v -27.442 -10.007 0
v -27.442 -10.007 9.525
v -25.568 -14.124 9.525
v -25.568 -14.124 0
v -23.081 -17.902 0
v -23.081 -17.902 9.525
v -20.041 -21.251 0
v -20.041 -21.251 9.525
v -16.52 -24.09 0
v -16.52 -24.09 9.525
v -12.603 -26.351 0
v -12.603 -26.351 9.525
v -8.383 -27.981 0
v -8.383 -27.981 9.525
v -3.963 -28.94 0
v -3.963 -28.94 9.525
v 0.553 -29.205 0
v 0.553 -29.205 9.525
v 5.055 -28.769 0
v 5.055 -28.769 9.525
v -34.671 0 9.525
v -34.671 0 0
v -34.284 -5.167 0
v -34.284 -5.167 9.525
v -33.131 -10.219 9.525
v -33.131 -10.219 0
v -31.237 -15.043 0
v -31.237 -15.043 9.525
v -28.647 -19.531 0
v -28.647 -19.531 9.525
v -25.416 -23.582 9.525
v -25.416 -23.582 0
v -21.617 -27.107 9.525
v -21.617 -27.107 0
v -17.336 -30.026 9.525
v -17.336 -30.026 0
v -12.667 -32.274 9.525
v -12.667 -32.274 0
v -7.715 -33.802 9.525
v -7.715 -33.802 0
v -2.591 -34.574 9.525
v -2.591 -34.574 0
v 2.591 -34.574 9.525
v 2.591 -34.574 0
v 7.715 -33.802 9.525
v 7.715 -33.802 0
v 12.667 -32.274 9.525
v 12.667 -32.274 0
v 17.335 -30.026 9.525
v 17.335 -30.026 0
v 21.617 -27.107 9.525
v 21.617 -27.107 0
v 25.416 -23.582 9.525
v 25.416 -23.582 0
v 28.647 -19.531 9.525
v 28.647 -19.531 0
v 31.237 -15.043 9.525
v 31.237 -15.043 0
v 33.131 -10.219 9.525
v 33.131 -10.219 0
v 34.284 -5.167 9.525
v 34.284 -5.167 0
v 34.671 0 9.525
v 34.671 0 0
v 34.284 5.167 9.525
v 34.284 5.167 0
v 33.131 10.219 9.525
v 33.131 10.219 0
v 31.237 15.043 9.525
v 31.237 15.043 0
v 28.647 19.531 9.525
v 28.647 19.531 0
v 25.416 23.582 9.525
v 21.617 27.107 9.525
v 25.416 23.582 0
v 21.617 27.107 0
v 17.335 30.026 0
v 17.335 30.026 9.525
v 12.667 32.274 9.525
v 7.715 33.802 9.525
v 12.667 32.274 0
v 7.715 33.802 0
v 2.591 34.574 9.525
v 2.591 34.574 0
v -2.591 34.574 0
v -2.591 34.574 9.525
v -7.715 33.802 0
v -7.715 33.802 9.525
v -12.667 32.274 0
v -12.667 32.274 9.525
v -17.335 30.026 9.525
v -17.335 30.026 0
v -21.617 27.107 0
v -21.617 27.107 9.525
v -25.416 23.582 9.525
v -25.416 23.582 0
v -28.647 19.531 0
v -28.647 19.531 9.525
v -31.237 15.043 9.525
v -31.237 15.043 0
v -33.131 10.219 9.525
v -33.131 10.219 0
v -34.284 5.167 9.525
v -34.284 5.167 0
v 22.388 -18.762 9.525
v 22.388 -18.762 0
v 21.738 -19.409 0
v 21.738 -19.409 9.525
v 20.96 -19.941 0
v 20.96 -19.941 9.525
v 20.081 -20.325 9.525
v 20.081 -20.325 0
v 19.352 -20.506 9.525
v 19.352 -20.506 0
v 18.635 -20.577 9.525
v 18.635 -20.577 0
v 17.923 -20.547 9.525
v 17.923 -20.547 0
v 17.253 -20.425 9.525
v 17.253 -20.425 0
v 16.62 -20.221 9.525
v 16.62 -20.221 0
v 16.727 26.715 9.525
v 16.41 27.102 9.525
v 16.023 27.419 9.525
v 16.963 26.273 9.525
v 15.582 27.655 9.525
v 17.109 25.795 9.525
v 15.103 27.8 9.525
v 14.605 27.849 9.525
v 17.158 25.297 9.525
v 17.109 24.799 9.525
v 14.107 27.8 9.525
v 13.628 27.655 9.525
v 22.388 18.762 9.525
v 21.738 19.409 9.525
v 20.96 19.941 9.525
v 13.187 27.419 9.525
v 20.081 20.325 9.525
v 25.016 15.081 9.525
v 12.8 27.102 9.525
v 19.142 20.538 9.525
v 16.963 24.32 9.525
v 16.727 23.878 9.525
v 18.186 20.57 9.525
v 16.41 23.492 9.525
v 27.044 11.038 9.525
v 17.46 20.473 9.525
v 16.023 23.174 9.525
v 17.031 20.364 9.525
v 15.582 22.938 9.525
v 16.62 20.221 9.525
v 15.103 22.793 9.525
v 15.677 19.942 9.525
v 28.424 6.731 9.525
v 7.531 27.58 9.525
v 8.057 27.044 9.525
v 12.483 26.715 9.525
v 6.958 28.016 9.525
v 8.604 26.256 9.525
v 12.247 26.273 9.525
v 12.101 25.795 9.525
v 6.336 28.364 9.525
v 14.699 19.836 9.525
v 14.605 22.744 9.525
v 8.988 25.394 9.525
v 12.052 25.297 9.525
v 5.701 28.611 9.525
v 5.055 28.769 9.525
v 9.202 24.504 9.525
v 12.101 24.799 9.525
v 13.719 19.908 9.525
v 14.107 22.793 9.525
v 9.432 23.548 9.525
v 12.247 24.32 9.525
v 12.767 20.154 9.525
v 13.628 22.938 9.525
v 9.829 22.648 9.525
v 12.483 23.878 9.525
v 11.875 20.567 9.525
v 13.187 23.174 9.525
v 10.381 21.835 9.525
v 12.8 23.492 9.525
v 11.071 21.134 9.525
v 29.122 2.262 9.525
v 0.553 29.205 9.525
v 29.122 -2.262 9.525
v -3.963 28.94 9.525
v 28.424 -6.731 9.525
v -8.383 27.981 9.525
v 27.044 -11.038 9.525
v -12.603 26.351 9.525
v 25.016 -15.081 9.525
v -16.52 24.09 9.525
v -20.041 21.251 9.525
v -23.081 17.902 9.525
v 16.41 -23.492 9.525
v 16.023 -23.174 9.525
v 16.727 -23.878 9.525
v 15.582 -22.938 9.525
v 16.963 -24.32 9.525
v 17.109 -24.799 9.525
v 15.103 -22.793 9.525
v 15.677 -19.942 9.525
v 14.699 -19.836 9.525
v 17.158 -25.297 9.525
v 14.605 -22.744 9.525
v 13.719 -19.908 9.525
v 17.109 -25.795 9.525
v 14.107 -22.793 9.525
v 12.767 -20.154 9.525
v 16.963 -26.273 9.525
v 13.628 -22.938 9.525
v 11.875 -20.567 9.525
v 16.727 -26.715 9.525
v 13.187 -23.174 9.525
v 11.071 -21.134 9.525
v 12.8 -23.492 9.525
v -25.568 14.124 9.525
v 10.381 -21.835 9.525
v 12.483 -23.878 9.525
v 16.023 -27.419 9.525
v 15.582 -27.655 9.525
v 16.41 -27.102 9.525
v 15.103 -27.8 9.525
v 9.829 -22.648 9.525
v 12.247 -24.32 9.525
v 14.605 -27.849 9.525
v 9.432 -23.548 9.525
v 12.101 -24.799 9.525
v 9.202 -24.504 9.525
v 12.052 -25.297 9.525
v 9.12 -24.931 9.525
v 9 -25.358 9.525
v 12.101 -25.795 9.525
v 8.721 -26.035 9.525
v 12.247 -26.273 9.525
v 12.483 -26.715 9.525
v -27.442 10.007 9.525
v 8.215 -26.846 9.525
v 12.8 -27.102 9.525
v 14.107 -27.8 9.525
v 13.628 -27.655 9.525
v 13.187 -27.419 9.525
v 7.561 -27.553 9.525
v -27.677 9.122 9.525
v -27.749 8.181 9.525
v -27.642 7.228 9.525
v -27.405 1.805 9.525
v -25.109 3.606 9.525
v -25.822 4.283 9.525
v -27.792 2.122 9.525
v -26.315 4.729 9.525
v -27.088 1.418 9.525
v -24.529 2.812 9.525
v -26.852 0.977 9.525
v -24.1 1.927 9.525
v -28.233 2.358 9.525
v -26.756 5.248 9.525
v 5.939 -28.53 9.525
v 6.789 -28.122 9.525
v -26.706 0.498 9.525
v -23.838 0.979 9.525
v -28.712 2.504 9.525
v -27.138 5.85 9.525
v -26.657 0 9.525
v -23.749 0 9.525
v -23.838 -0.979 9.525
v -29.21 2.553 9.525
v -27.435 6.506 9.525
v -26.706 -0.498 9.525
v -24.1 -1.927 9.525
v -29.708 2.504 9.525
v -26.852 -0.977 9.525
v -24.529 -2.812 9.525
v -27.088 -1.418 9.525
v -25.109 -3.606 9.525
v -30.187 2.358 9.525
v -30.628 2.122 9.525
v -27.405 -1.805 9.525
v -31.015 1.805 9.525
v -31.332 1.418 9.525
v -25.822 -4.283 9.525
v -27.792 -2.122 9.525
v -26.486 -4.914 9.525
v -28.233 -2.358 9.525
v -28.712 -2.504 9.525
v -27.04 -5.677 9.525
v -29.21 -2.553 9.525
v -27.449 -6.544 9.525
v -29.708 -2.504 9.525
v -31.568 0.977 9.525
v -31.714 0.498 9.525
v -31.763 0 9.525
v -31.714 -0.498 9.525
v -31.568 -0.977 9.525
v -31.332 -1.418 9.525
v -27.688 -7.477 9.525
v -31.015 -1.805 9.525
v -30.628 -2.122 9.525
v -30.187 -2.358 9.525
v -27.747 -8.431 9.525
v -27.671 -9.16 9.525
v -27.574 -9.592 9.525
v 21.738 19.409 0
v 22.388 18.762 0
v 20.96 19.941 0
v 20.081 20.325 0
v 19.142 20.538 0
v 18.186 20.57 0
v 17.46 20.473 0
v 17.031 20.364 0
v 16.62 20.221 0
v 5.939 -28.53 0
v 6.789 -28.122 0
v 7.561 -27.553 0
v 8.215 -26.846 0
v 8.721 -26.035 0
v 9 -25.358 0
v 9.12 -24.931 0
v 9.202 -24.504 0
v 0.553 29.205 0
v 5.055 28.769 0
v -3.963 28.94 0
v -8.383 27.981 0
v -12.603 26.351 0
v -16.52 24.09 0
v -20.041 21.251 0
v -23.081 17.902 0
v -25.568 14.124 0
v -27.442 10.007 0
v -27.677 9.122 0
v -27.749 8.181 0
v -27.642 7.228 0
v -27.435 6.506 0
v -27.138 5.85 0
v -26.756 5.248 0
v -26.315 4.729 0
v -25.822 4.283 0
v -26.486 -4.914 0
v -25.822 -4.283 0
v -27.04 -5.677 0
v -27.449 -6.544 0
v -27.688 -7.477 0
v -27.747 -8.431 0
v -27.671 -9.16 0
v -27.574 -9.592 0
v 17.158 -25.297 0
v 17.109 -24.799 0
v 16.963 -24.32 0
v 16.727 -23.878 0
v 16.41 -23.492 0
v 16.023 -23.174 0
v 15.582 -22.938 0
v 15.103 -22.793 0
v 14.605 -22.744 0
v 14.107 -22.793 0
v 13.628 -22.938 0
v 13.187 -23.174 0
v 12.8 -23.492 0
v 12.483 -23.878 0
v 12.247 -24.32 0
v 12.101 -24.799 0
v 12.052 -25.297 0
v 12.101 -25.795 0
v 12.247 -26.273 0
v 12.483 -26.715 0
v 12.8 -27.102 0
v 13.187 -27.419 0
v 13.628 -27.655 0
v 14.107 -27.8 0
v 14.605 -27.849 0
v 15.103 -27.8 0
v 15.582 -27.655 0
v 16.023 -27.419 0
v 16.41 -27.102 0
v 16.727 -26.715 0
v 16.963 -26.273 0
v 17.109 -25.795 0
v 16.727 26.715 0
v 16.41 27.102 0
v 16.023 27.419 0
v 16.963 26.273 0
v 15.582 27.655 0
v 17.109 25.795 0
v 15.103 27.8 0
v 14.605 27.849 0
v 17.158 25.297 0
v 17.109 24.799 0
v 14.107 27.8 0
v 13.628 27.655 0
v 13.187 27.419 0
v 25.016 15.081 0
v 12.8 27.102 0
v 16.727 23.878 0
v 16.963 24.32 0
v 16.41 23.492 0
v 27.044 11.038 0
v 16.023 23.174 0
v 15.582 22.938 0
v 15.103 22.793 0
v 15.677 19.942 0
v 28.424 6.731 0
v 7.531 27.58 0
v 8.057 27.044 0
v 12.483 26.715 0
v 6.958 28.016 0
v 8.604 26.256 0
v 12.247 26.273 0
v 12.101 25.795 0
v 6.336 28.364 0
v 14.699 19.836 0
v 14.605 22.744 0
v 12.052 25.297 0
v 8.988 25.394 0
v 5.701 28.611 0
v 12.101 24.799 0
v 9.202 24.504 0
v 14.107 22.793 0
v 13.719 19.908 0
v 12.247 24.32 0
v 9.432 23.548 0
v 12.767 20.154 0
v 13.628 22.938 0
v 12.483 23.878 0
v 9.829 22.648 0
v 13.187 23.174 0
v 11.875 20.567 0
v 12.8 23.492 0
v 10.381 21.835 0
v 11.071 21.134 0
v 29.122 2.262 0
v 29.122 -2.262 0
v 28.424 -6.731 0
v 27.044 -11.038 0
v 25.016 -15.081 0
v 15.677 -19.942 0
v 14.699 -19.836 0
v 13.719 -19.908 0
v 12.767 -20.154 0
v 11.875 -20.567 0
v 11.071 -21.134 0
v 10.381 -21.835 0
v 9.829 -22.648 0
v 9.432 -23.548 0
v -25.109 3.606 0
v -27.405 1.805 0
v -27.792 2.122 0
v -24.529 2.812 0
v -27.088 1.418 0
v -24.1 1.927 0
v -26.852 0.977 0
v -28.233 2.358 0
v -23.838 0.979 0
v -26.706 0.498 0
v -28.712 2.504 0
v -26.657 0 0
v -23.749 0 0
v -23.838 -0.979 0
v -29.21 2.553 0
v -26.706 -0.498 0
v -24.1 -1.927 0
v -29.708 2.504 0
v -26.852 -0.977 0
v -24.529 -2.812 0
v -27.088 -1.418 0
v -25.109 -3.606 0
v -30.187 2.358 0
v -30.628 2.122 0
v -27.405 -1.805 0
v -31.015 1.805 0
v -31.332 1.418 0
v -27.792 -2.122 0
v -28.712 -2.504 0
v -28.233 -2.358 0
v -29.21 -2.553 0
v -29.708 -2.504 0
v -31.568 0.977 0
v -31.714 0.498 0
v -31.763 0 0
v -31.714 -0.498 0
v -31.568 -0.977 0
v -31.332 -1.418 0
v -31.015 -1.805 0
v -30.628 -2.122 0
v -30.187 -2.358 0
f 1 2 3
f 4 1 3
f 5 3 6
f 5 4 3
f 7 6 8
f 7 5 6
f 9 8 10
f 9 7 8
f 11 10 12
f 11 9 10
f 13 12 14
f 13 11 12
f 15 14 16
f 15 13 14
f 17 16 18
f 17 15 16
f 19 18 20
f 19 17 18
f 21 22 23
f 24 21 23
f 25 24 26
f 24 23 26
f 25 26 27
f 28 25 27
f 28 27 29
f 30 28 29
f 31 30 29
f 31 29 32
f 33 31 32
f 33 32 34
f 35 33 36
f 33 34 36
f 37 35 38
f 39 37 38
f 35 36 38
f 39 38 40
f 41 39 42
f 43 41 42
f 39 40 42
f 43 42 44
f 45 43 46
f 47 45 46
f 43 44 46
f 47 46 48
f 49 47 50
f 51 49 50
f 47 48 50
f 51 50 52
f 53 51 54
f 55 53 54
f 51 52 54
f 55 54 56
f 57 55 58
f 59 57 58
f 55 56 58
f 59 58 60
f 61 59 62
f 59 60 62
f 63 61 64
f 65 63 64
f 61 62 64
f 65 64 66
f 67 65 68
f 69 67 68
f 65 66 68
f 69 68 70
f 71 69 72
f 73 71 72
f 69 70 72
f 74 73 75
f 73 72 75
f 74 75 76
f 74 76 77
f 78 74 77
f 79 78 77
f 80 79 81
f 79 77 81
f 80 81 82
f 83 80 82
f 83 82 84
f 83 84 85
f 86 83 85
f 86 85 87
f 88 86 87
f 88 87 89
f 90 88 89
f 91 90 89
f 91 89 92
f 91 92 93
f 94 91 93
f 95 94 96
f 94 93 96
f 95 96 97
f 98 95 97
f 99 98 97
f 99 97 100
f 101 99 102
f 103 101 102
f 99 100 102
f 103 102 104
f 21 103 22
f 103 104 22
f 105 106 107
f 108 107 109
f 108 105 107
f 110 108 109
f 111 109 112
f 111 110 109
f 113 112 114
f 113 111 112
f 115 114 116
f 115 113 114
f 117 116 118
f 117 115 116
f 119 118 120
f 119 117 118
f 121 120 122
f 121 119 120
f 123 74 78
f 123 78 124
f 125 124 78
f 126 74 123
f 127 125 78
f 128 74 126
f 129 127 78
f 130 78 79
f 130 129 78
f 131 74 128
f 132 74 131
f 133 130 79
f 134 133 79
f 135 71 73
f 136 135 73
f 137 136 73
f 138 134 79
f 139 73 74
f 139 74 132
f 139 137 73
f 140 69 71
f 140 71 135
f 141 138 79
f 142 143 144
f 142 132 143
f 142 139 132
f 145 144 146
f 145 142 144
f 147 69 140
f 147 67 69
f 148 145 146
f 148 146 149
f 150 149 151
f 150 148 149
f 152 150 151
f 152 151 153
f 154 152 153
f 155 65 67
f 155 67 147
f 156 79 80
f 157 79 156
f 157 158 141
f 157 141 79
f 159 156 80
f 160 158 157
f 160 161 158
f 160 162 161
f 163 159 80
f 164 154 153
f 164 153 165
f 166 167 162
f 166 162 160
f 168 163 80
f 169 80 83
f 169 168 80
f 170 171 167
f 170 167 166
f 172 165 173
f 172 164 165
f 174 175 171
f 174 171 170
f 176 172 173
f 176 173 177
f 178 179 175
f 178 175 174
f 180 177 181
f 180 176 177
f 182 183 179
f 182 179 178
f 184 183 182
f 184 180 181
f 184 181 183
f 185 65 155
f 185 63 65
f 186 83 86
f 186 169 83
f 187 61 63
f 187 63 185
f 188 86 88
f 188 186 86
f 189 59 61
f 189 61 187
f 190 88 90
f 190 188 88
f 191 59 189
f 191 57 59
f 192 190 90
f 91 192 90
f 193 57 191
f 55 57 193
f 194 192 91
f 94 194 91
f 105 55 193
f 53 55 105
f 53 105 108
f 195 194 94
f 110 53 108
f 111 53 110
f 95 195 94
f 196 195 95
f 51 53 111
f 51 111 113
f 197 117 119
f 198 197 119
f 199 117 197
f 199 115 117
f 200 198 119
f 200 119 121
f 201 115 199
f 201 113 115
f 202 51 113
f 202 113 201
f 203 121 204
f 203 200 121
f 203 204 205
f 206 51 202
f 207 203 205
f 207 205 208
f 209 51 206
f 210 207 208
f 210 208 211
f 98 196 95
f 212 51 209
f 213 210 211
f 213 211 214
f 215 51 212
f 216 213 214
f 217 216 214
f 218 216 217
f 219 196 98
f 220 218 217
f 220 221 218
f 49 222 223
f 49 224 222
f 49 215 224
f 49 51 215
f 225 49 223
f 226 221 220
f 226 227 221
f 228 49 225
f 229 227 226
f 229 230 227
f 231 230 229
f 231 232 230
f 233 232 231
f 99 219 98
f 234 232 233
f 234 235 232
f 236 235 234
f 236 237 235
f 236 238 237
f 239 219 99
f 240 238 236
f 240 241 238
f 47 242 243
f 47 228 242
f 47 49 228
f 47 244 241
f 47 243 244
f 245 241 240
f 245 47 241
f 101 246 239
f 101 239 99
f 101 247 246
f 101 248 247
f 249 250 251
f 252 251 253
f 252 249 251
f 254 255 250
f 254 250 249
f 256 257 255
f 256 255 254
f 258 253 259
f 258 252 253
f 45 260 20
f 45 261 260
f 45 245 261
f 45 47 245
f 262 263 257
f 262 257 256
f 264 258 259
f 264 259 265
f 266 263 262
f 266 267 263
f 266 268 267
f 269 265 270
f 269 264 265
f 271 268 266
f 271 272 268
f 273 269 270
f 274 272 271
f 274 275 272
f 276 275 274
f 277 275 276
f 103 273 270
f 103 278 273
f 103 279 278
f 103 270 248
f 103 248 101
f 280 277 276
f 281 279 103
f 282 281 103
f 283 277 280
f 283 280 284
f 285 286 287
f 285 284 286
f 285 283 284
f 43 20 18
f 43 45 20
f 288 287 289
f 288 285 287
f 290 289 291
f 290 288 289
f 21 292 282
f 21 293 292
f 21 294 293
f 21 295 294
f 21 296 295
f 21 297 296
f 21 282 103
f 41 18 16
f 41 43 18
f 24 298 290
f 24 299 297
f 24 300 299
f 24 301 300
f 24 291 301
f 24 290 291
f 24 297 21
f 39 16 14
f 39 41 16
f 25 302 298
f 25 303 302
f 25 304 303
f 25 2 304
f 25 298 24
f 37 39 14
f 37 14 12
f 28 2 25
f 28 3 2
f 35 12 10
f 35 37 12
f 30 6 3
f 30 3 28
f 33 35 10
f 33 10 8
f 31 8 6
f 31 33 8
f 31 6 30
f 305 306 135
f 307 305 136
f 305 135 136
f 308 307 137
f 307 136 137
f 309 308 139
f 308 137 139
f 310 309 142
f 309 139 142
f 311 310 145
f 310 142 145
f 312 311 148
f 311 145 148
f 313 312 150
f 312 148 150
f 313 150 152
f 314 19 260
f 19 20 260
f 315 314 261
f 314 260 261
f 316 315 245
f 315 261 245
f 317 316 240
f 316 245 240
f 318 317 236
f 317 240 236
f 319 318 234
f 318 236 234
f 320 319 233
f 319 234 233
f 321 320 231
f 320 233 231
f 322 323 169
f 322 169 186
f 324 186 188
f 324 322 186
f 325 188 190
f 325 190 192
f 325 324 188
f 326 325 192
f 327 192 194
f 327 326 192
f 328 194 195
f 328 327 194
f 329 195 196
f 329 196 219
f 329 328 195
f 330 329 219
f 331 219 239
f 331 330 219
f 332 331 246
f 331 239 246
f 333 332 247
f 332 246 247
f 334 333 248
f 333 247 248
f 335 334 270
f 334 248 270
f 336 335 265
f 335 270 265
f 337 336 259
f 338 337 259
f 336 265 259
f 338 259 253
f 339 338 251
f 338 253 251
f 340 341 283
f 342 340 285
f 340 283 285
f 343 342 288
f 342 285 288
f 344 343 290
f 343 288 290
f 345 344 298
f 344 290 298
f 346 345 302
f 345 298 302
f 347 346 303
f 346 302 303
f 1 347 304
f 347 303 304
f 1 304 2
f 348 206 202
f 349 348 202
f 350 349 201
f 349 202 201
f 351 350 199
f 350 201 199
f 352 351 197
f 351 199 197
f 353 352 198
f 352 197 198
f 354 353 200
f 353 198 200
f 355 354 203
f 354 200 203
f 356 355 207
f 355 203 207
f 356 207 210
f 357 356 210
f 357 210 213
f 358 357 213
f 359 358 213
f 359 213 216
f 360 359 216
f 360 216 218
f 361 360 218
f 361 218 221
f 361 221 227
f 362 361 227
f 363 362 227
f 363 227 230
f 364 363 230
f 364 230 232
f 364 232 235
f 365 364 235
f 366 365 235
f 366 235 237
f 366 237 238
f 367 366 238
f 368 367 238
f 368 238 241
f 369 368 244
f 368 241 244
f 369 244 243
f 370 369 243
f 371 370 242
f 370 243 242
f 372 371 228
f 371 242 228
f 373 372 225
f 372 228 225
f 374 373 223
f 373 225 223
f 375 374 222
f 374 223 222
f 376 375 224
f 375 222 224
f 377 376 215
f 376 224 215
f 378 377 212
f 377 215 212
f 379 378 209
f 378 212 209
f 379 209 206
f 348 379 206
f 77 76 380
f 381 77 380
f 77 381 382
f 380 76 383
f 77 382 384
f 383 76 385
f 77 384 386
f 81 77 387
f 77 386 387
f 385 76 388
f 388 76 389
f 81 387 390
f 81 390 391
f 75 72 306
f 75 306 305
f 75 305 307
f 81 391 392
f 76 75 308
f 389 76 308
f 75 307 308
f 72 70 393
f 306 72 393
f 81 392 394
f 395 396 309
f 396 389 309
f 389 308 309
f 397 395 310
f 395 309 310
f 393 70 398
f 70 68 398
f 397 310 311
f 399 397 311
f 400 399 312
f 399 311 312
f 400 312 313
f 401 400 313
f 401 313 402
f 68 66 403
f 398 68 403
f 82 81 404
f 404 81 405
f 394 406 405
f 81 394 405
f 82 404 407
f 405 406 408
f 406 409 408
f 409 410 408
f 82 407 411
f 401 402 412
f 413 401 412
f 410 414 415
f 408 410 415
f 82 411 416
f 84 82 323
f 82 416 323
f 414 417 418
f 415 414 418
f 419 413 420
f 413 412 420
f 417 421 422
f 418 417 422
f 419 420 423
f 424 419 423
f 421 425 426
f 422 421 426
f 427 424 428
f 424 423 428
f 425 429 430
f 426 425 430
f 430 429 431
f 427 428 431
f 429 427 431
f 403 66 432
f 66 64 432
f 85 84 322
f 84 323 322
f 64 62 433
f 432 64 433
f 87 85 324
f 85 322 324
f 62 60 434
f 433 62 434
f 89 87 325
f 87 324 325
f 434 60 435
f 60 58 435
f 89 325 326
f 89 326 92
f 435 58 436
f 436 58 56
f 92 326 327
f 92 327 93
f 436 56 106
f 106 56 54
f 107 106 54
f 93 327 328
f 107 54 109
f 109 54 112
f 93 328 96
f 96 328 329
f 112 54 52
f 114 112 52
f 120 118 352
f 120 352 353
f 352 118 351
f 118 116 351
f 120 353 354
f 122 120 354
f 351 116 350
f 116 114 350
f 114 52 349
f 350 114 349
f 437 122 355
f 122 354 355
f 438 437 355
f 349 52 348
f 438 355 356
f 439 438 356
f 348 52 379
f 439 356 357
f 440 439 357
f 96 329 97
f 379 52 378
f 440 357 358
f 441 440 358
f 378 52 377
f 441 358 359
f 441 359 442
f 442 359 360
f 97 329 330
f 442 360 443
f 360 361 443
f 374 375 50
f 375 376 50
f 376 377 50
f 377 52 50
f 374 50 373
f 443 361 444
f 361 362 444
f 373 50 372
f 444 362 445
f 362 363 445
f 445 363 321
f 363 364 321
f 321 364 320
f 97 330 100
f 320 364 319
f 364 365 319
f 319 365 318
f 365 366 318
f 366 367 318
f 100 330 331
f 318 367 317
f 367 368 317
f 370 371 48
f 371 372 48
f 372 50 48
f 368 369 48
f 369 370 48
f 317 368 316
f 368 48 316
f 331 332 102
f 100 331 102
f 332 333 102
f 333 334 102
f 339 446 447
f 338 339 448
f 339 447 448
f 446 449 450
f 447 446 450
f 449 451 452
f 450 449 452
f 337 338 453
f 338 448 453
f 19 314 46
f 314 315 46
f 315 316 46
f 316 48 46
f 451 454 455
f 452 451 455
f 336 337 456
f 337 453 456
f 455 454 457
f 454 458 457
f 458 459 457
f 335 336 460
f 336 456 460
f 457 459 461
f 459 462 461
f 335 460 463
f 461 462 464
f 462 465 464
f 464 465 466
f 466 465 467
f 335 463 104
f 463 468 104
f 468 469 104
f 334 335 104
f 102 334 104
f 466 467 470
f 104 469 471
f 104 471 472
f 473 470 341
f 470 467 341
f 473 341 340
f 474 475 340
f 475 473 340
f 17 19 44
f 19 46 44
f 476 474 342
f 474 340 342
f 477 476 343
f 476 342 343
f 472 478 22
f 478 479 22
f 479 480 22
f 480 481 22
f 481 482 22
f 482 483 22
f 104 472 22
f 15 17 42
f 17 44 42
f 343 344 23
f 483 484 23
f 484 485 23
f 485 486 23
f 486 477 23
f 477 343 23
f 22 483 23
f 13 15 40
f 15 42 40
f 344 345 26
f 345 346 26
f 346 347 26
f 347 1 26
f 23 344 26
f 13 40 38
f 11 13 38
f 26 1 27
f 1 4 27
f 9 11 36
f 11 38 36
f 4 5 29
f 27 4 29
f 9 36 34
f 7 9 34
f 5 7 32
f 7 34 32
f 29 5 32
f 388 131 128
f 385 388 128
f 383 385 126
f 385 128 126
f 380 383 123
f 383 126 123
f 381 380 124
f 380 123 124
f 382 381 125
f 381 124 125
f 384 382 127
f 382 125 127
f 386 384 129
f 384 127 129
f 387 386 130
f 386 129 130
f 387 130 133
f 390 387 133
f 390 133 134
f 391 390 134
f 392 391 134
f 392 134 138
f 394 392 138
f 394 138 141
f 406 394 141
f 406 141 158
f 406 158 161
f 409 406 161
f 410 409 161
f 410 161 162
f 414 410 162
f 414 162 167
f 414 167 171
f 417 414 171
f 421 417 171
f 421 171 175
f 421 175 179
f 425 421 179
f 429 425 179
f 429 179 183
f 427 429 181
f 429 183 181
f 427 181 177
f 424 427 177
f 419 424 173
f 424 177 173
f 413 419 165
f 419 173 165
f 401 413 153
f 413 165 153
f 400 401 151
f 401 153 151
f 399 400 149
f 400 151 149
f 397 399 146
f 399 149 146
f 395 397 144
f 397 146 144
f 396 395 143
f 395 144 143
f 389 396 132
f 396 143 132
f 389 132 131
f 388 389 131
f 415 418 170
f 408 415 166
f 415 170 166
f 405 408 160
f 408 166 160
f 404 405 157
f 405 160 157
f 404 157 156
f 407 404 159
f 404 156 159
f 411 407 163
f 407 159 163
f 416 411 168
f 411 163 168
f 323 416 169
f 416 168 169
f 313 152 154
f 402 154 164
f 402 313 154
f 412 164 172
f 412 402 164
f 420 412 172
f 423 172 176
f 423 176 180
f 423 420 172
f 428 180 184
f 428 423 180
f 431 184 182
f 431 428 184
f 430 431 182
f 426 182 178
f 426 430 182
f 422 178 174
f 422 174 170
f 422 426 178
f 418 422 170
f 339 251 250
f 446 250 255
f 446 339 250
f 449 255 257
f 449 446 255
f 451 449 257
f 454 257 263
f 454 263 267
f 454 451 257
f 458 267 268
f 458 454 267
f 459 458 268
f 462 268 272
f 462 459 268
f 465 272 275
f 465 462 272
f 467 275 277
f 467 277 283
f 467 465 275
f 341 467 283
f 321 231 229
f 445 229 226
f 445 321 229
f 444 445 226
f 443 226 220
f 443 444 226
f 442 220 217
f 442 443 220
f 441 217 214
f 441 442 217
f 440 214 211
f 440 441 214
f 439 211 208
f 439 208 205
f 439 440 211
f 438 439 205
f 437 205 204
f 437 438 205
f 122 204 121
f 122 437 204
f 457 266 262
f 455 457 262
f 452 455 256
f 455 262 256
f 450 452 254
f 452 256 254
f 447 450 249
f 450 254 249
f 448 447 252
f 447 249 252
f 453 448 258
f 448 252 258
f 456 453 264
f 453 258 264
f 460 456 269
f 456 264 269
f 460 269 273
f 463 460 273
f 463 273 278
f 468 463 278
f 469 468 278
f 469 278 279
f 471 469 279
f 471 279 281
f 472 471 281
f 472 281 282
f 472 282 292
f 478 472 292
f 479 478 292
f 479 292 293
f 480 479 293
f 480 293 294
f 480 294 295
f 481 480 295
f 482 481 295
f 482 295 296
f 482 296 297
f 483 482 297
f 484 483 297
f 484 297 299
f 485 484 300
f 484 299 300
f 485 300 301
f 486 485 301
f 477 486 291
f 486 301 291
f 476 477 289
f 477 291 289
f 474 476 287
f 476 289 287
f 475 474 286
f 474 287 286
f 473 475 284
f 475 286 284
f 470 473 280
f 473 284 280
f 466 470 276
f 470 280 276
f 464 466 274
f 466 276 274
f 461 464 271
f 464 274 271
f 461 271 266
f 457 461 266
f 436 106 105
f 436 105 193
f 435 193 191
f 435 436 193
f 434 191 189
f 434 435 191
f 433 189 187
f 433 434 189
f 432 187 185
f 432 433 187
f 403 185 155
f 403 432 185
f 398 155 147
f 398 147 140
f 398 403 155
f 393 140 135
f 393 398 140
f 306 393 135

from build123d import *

# Parameters (mm, degrees)
SKETCH1_R              = 34.671
BOSS_EXTRUDE1_DEPTH    = 9.525
FILLET1_R              = 5.08
F_10_CLEARANCE_HOLE1_D = 5.1054


with BuildPart() as part:
    # Sketch1 → Boss-Extrude1 (new body)
    with BuildSketch(Plane.XY):
        with Locations(Location((0, 0, 0), (0, 0, 180))):
            Circle(SKETCH1_R)
        with BuildLine():
            ThreePointArc((19.058413969, -22.135965238), (29.21, 0), (19.058413969, 22.135965238))
            ThreePointArc((19.058413969, 22.135965238), (11.8745, 20.567237314), (9.641101249, 27.573053271))
            ThreePointArc((9.641101249, 27.573053271), (-14.605, 25.296602045), (-28.699515217, 5.437088034))
            ThreePointArc((-28.699515217, 5.437088034), (-23.749, 0), (-28.699515217, -5.437088034))
            ThreePointArc((-28.699515217, -5.437088034), (-14.605, -25.296602045), (9.641101249, -27.573053271))
            ThreePointArc((9.641101249, -27.573053271), (11.8745, -20.567237314), (19.058413969, -22.135965238))
        make_face(mode=Mode.SUBTRACT)
    extrude(amount=BOSS_EXTRUDE1_DEPTH)

    # Fillet1
    fillet1_edges = [part.edges().sort_by_distance(p)[0] for p in [
        (-28.699515217, 5.437088034, 4.7625),
        (-28.699515217, -5.437088034, 4.7625),
        (9.641101249, -27.573053271, 4.7625),
        (19.058413969, -22.135965238, 4.7625),
        (19.058413969, 22.135965238, 4.7625),
        (9.641101249, 27.573053271, 4.7625),
    ]]
    fillet(fillet1_edges, radius=FILLET1_R)

    # #10 Clearance Hole1 (through all)
    with Locations(Plane(origin=(0, 0, 0), x_dir=(-1, 0, 0), z_dir=(0, 0, -1))):
        with Locations((-14.605, 25.296602045), (29.21, 0), (-14.605, -25.296602045)):
            Hole(F_10_CLEARANCE_HOLE1_D / 2)


solid = part.part
